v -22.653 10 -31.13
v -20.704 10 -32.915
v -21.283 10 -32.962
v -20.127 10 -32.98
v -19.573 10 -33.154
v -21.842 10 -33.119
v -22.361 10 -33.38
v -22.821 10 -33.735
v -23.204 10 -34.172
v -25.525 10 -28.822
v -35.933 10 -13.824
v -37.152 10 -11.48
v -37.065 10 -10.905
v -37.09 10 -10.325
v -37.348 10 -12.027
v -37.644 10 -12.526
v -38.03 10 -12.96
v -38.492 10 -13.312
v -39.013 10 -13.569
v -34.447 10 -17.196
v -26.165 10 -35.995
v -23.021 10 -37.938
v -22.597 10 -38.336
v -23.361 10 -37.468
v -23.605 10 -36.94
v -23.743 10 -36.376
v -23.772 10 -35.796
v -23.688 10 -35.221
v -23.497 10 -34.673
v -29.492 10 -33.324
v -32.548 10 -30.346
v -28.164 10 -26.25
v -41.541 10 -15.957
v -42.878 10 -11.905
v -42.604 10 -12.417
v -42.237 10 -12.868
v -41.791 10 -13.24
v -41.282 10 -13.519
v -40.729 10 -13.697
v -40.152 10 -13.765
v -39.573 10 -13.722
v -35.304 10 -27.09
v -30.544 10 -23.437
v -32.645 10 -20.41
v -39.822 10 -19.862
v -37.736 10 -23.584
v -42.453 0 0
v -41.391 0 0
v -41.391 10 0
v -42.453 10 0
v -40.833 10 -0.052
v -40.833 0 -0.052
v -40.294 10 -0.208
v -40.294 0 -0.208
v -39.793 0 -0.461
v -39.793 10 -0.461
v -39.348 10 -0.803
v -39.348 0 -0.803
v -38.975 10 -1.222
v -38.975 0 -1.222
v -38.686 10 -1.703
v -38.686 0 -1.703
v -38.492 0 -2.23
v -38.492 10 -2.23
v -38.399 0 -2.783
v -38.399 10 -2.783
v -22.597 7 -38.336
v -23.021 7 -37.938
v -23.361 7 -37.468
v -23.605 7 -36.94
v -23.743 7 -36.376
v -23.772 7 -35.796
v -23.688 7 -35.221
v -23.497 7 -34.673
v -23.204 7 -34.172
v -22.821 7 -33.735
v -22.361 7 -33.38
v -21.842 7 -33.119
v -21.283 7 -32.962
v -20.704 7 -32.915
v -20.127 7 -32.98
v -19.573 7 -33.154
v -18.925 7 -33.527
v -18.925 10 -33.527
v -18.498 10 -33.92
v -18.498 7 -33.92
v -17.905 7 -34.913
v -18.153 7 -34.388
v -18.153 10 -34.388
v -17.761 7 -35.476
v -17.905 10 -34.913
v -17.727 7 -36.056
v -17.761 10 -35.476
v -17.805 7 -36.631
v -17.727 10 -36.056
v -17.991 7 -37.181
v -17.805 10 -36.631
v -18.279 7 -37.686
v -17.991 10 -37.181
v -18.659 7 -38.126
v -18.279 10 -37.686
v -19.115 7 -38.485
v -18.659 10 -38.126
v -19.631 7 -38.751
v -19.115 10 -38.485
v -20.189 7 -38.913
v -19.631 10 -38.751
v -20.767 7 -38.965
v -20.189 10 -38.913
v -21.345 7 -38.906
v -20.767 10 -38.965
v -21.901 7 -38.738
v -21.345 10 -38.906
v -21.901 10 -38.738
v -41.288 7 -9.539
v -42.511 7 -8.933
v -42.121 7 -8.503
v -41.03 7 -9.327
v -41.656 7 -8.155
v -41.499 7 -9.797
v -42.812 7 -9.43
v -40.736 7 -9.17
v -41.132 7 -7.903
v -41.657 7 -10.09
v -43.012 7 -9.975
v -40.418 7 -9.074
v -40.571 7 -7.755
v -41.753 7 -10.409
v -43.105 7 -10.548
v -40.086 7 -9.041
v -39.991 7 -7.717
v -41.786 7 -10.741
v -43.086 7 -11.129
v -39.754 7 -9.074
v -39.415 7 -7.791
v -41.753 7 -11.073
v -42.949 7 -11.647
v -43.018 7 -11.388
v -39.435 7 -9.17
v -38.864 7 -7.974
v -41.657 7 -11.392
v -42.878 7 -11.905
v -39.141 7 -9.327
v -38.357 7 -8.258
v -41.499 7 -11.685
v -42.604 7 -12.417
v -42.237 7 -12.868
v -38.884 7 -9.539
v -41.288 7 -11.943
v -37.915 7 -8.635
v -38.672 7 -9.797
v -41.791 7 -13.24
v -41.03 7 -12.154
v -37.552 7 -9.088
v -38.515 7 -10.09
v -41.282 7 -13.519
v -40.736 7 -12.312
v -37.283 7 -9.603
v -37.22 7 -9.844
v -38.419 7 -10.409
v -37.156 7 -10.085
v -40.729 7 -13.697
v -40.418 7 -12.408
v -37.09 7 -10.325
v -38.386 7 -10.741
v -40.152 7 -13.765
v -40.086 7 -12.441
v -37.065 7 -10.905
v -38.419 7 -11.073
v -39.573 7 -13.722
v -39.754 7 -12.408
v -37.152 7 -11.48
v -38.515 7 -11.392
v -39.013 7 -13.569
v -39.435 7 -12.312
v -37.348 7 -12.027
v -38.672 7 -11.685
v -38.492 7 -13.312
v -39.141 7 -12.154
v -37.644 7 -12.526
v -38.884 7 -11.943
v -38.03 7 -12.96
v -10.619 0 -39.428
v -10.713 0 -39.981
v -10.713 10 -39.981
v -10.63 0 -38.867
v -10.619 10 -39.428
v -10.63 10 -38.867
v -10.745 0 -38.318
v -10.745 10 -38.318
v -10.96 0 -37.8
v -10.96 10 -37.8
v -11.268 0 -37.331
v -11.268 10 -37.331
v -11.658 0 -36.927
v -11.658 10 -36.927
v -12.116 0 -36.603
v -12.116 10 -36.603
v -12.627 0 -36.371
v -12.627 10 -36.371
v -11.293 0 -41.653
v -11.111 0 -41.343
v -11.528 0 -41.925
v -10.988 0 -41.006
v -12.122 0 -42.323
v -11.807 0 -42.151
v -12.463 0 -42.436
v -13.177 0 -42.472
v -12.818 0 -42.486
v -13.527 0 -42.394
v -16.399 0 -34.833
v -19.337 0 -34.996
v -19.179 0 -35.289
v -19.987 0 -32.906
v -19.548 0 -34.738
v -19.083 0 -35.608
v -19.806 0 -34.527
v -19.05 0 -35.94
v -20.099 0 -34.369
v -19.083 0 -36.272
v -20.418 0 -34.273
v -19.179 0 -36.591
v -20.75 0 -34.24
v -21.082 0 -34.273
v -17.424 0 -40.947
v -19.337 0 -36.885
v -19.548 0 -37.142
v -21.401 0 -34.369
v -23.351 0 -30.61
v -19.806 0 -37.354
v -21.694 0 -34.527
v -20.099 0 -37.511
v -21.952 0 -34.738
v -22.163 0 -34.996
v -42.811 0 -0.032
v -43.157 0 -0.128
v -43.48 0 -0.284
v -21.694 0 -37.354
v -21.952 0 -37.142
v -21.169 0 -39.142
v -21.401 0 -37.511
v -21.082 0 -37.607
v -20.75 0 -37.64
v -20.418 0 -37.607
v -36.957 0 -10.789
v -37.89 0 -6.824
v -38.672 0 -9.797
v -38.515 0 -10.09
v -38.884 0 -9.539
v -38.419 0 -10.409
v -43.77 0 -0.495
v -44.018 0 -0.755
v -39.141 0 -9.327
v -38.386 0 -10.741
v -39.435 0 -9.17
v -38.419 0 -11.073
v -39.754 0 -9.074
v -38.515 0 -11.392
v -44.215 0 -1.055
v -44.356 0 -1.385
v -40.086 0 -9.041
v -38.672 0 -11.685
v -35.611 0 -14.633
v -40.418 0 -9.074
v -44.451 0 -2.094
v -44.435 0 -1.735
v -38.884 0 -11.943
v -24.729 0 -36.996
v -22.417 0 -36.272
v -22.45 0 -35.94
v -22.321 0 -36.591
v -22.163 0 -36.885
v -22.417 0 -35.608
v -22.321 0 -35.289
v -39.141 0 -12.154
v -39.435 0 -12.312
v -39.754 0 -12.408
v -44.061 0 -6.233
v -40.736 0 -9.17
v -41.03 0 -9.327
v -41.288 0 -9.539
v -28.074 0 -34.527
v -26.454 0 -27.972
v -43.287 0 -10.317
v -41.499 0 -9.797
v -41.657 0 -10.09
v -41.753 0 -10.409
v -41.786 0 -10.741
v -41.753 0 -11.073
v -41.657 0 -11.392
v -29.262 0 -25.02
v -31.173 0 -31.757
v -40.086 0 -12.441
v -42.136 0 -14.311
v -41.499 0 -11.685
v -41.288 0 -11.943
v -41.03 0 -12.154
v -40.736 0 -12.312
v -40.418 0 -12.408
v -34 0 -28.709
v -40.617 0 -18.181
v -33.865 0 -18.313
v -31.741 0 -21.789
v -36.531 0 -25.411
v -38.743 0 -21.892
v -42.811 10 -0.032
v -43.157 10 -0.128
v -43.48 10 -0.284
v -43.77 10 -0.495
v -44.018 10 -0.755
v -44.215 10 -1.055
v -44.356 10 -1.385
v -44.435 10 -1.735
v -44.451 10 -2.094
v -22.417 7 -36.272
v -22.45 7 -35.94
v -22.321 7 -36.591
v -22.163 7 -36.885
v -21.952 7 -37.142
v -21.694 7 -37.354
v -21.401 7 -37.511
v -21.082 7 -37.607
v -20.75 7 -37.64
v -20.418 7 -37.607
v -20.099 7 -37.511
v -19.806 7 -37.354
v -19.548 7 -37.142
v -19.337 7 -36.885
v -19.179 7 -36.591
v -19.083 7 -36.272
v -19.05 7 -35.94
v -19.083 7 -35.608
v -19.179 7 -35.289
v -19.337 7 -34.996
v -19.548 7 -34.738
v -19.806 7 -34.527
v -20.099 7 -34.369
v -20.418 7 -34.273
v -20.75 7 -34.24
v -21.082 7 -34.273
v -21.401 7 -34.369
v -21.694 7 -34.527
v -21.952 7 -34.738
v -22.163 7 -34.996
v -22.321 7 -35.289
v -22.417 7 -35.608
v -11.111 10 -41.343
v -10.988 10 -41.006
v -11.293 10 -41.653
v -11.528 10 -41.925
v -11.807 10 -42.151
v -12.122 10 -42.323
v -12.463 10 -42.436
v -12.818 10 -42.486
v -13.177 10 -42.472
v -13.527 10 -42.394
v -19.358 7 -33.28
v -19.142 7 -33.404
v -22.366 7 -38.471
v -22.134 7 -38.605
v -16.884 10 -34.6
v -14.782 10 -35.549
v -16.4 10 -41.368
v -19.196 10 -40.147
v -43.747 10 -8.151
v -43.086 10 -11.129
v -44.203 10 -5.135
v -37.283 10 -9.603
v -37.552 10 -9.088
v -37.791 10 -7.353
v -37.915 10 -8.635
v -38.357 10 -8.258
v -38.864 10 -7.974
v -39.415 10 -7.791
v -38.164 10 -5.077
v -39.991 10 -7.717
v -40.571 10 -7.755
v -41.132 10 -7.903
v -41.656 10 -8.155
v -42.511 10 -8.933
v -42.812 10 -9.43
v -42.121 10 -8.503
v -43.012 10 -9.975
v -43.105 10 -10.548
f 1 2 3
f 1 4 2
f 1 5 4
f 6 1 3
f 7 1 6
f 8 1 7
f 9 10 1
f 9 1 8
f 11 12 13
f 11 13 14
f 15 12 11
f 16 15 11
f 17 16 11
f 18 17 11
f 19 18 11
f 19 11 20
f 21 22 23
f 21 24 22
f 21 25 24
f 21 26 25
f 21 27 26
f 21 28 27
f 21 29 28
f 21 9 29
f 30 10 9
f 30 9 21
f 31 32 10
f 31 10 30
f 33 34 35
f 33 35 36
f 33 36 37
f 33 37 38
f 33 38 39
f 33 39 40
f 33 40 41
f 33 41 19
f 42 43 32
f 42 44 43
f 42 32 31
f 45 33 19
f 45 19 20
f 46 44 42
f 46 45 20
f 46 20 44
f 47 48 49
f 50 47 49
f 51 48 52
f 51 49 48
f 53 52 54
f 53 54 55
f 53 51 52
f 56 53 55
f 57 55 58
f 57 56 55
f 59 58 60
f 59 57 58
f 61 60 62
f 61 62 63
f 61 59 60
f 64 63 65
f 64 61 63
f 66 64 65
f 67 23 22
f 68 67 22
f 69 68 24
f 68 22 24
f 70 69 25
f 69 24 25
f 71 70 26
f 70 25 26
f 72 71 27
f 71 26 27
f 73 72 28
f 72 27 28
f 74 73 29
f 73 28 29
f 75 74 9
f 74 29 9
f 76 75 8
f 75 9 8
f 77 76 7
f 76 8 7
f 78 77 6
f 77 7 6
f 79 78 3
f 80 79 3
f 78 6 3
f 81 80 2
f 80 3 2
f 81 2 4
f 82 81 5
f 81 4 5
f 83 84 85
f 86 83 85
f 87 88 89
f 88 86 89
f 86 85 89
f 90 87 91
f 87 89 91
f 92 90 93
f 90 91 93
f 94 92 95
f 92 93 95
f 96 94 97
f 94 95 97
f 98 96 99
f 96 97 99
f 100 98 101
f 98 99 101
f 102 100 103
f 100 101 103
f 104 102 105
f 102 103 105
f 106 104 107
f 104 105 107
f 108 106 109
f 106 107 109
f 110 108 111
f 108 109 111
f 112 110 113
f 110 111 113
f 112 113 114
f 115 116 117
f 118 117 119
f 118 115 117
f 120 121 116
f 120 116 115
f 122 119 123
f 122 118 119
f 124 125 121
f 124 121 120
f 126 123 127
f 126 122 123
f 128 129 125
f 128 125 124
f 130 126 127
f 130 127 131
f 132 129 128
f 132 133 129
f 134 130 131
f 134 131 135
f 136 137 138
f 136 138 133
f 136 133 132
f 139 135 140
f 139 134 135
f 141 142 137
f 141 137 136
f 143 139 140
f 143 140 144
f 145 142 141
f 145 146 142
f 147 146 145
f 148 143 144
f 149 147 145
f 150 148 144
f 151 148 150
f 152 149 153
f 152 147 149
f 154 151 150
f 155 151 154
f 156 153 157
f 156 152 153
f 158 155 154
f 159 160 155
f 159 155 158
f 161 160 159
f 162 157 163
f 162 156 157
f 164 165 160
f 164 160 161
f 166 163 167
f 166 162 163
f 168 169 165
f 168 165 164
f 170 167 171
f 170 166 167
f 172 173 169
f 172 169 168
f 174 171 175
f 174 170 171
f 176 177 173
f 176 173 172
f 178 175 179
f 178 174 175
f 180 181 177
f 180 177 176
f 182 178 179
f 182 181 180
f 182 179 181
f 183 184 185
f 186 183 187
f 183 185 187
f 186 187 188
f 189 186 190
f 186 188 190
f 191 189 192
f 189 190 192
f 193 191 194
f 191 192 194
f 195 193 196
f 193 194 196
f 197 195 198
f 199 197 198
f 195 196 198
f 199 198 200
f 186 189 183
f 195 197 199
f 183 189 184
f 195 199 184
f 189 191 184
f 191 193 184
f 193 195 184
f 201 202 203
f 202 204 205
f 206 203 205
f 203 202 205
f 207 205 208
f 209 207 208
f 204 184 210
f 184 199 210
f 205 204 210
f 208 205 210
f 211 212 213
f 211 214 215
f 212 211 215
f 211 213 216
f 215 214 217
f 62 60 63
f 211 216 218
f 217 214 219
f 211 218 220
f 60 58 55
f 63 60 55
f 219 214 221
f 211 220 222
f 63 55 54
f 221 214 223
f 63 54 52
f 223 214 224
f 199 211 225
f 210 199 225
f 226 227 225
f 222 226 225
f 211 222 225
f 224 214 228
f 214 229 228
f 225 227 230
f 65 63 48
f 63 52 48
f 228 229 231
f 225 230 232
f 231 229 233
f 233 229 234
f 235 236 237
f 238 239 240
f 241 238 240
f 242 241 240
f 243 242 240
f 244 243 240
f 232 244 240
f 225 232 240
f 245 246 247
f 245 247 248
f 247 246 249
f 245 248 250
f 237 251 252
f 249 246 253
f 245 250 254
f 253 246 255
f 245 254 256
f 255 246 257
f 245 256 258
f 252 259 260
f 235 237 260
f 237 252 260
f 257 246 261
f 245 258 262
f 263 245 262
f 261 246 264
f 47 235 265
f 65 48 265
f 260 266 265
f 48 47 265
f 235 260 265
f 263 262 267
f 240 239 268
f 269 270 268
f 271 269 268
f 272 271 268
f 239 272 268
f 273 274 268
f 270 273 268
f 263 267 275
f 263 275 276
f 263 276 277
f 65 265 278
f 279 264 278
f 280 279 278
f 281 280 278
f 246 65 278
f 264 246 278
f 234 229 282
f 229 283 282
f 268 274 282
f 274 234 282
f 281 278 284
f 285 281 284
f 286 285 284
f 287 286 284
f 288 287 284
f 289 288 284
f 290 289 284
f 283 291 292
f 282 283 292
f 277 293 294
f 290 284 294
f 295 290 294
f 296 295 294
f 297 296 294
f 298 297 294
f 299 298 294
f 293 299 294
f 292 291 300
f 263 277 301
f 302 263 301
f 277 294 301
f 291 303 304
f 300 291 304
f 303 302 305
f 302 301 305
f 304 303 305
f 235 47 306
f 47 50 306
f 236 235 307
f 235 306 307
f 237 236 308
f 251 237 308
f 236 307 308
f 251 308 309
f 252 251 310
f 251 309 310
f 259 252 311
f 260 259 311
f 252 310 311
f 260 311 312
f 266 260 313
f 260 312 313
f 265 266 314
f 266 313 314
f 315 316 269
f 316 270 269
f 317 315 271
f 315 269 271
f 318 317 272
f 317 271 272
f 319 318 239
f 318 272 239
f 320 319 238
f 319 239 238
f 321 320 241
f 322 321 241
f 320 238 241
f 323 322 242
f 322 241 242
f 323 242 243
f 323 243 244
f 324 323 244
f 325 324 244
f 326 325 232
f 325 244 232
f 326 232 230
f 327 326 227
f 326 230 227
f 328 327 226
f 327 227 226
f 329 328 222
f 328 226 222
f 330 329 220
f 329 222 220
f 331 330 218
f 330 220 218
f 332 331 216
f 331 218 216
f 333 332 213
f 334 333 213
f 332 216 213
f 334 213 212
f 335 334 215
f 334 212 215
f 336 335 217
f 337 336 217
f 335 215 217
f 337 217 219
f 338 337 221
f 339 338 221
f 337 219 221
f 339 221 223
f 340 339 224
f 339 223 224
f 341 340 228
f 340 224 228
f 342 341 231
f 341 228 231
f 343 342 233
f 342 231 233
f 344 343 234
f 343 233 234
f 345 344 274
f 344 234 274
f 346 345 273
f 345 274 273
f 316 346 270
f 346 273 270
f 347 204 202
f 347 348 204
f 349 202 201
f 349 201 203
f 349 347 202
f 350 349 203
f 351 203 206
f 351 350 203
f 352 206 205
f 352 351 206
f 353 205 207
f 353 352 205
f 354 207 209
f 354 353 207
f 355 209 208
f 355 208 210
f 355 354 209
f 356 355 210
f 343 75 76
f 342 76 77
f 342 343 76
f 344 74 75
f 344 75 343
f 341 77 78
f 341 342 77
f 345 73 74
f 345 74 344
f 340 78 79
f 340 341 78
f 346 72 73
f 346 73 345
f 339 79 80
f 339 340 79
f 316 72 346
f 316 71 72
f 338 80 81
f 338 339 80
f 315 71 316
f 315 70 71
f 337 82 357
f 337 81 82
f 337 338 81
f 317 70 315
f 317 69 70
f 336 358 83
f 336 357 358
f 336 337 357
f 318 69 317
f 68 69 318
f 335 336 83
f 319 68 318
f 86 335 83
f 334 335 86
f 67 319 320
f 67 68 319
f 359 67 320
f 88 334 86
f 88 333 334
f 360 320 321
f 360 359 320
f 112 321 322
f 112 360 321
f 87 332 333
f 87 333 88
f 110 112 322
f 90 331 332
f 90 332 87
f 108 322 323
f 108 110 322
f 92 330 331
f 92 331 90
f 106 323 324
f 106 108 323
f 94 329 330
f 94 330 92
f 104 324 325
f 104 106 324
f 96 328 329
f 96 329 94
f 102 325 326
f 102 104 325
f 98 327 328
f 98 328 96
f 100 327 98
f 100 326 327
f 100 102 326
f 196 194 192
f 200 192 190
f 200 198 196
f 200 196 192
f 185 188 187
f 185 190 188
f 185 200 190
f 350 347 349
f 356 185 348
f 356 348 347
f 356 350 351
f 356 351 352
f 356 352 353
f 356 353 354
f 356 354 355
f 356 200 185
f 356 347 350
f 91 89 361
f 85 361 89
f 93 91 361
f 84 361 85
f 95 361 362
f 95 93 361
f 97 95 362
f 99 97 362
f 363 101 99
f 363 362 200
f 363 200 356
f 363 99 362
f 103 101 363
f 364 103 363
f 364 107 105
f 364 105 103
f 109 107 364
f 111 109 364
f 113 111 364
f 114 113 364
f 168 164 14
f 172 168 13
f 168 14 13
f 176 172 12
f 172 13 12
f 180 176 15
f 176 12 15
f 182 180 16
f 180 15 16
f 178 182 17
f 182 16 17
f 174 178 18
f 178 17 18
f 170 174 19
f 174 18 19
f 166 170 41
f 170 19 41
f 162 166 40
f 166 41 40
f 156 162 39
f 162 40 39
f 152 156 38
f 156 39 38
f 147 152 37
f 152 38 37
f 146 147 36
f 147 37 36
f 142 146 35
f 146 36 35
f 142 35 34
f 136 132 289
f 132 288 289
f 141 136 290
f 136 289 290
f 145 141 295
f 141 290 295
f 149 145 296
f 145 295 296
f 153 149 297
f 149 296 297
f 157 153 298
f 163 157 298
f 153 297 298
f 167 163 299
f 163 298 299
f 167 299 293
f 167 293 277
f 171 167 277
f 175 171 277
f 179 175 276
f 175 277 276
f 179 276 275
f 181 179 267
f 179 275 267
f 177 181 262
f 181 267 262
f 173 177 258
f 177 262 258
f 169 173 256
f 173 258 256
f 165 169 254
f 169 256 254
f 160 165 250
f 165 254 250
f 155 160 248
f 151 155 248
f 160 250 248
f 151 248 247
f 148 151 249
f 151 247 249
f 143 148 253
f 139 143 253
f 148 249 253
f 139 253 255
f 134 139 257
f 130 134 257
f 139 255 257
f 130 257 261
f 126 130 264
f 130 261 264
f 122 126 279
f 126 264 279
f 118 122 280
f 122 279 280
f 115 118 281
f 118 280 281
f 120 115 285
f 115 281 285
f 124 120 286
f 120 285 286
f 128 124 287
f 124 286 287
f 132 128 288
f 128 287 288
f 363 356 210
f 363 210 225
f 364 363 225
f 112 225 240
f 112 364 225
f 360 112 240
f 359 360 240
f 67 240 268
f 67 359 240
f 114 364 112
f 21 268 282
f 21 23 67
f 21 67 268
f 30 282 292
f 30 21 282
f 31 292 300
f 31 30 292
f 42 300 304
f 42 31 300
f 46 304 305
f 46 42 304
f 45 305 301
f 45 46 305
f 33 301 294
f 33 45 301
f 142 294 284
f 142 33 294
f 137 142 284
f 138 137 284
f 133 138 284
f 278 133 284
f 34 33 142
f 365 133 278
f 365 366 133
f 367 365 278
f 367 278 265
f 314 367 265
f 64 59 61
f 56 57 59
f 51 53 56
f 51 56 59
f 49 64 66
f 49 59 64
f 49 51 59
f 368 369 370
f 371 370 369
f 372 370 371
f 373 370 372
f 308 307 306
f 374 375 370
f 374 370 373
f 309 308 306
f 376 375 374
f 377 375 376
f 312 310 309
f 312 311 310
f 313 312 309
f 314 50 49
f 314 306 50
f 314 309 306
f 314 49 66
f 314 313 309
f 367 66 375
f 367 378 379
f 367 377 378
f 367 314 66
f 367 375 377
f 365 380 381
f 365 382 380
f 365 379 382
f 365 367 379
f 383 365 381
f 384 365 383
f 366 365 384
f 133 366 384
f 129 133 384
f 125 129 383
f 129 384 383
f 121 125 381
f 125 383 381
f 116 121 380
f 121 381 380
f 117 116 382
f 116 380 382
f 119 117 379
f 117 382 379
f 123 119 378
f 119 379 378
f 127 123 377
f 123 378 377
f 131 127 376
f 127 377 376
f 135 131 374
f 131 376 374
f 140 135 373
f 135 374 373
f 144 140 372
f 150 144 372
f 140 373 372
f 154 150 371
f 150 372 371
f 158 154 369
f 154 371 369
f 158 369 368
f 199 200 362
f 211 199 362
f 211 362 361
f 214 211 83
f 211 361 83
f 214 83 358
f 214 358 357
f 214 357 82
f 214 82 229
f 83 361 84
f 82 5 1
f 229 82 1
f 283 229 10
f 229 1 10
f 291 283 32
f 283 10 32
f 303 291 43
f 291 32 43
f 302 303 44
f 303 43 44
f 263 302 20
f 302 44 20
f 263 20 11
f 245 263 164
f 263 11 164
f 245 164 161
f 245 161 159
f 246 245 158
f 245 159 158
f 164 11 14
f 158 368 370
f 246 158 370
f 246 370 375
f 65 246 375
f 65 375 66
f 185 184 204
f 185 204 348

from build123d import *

# Parameters (mm, degrees)
SKETCH_1_W                  = 10
SKETCH_1_H                  = 6
REVOLVE_1_ANGLE             = 75
HOLE_WIZARD_M31_D           = 3.4
HOLE_WIZARD_M31_CBORE_D     = 6.05
HOLE_WIZARD_M31_CBORE_DEPTH = 3
FILLET_1_R                  = 2
FILLET_2_R                  = 3


with BuildPart() as part:
    # Эскиз1 → Повернуть1 (revolve)
    with BuildSketch(Plane(origin=(0, 0, 0), x_dir=(0, 1, 0), z_dir=(0.9659258262890689, 0, -0.258819045102519))):
        with Locations((5, -41.5)):
            Rectangle(SKETCH_1_W, SKETCH_1_H)
    revolve(axis=Axis((0, 10, 0), (0, 1, 0)), revolution_arc=REVOLVE_1_ANGLE)

    # Цековка для винта с заклепочной головкой M31 (through all)
    with Locations(Plane(origin=(0, 10, 0), x_dir=(1, 0, 0), z_dir=(0, 1, 0))):
        with Locations((-40.085921791, 10.740990372), (-20.75, 35.940054257)):
            CounterBoreHole(HOLE_WIZARD_M31_D / 2, HOLE_WIZARD_M31_CBORE_D / 2, HOLE_WIZARD_M31_CBORE_DEPTH)

    # Скругление1
    fillet_1_edges = [part.edges().sort_by_distance(p)[0] for p in [
        (-11.517447507, 5, -42.98369927),
        (-44.5, 5, 0),
    ]]
    fillet(fillet_1_edges, radius=FILLET_1_R)

    # Скругление2
    fillet_2_edges = [part.edges().sort_by_distance(p)[0] for p in [
        (-38.5, 5, 0),
        (-9.964533236, 5, -37.188144312),
    ]]
    fillet(fillet_2_edges, radius=FILLET_2_R)


solid = part.part
